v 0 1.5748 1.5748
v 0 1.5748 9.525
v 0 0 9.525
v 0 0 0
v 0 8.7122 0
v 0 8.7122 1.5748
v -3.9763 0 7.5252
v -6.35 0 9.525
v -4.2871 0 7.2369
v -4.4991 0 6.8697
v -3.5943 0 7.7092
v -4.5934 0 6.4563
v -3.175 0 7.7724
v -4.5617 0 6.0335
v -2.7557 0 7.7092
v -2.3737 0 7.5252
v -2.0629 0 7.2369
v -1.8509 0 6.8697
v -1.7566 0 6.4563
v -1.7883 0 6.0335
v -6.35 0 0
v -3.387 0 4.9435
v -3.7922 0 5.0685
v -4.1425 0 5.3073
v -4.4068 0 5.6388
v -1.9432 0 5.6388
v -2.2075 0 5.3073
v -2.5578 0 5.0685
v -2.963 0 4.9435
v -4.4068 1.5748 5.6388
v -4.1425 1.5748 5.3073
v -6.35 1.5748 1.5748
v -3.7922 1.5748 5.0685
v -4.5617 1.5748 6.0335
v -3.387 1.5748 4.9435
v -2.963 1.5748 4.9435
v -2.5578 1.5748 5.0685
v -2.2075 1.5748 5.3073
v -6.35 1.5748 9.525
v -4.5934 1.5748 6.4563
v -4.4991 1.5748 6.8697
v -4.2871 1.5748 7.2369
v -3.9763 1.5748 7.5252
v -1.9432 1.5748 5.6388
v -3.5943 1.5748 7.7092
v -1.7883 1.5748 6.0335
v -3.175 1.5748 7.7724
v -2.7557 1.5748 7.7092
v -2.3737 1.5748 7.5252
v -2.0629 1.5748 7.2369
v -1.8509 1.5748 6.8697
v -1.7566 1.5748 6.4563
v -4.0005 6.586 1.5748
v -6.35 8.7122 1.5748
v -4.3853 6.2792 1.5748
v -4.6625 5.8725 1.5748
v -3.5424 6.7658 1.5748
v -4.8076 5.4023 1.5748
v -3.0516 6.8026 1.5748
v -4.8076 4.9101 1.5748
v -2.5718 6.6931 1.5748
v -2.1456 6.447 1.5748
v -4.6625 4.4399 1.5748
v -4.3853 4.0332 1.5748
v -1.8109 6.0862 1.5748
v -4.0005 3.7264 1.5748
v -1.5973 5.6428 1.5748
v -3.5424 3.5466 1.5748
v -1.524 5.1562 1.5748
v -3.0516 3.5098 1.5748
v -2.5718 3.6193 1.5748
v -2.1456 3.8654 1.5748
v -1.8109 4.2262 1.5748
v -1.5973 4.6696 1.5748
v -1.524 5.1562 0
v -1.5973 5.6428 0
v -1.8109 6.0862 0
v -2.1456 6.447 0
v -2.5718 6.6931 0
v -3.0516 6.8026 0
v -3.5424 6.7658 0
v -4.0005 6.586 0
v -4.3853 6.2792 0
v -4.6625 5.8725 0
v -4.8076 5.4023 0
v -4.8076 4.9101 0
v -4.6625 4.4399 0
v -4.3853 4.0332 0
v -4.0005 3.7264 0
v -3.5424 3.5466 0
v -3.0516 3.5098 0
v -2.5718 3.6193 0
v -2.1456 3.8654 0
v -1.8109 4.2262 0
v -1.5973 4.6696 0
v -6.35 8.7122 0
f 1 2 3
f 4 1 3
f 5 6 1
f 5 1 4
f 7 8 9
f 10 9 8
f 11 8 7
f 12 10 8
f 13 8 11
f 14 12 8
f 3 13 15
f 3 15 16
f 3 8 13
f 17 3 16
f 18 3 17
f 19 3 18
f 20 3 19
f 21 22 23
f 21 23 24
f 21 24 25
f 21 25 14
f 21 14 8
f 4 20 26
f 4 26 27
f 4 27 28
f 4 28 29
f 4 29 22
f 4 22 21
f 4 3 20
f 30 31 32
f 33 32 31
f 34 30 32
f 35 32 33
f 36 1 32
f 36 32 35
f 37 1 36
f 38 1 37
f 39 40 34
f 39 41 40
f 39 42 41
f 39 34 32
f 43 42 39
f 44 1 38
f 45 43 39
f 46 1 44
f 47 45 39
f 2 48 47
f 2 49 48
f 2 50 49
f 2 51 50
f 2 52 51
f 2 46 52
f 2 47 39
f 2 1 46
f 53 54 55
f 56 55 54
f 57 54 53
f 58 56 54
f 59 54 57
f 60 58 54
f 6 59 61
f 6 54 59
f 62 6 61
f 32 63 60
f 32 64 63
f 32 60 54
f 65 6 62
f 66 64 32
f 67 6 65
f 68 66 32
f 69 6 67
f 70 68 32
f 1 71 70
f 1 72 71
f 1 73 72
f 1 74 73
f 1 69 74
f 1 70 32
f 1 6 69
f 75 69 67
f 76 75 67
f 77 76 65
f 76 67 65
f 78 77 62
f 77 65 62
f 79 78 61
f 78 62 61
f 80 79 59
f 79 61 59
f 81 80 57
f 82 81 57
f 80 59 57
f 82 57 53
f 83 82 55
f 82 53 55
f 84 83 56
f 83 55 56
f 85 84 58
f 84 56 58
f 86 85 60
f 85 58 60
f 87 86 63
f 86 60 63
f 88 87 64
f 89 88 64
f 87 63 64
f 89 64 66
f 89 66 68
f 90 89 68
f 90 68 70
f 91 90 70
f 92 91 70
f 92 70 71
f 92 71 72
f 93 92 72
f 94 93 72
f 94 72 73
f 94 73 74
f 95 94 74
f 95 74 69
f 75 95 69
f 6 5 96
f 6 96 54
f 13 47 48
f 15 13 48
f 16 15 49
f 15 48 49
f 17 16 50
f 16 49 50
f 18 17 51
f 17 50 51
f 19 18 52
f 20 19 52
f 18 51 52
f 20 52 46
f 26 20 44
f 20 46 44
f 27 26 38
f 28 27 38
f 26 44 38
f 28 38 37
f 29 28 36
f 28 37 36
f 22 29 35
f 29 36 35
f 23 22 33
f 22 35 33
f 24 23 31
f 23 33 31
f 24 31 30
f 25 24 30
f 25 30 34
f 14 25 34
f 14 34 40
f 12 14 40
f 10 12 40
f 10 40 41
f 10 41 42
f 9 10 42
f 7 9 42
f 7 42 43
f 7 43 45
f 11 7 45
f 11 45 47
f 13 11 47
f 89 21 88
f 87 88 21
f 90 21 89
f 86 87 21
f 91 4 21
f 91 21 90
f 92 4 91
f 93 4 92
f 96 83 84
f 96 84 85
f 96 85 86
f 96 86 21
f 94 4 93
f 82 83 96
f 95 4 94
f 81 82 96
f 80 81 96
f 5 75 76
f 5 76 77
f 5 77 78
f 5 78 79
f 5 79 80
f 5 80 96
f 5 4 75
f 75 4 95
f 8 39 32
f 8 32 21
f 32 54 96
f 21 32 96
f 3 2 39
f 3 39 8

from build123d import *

# Parameters (mm, degrees)
BOSS_EXTRUDE1_DEPTH = 6.35
CUT_EXTRUDE1_REACH  = 15.395
SKETCH2_R           = 1.651
CUT_EXTRUDE2_REACH  = 15.49
SKETCH3_R           = 1.4224


with BuildPart() as part:
    # Sketch1 → Boss-Extrude1 (new body)
    with BuildSketch(Plane(origin=(0, 0, 0), x_dir=(0, 0, -1), z_dir=(1, 0, 0))):
        Polygon((0, 0), (0, 8.7122), (-1.5748, 8.7122), (-1.5748, 1.5748), (-9.525, 1.5748), (-9.525, 0), align=None)
    extrude(amount=-BOSS_EXTRUDE1_DEPTH)

    # Sketch2 → Cut-Extrude1 (cut, up to next)
    with BuildSketch(Plane.XY.offset(1.5748), mode=Mode.PRIVATE) as cut_extrude1_sk1:
        with Locations((-3.175, 5.1562)):
            Circle(SKETCH2_R)
    cut_extrude1_tool1 = extrude(cut_extrude1_sk1.sketch, amount=-CUT_EXTRUDE1_REACH, mode=Mode.PRIVATE) & part.part
    add(cut_extrude1_tool1.solids().sort_by_distance((-3.175, 5.1562, 1.5748))[0], mode=Mode.SUBTRACT)

    # Sketch3 → Cut-Extrude2 (cut, up to next)
    with BuildSketch(Plane(origin=(0, 1.5748, 0), x_dir=(1, 0, 0), z_dir=(0, 1, 0)), mode=Mode.PRIVATE) as cut_extrude2_sk1:
        with Locations(Location((-3.175, -6.35, 0), (0, 0, 270))):
            Circle(SKETCH3_R)
    cut_extrude2_tool1 = extrude(cut_extrude2_sk1.sketch, amount=-CUT_EXTRUDE2_REACH, mode=Mode.PRIVATE) & part.part
    add(cut_extrude2_tool1.solids().sort_by_distance((-3.175, 1.5748, 6.35))[0], mode=Mode.SUBTRACT)


solid = part.part
